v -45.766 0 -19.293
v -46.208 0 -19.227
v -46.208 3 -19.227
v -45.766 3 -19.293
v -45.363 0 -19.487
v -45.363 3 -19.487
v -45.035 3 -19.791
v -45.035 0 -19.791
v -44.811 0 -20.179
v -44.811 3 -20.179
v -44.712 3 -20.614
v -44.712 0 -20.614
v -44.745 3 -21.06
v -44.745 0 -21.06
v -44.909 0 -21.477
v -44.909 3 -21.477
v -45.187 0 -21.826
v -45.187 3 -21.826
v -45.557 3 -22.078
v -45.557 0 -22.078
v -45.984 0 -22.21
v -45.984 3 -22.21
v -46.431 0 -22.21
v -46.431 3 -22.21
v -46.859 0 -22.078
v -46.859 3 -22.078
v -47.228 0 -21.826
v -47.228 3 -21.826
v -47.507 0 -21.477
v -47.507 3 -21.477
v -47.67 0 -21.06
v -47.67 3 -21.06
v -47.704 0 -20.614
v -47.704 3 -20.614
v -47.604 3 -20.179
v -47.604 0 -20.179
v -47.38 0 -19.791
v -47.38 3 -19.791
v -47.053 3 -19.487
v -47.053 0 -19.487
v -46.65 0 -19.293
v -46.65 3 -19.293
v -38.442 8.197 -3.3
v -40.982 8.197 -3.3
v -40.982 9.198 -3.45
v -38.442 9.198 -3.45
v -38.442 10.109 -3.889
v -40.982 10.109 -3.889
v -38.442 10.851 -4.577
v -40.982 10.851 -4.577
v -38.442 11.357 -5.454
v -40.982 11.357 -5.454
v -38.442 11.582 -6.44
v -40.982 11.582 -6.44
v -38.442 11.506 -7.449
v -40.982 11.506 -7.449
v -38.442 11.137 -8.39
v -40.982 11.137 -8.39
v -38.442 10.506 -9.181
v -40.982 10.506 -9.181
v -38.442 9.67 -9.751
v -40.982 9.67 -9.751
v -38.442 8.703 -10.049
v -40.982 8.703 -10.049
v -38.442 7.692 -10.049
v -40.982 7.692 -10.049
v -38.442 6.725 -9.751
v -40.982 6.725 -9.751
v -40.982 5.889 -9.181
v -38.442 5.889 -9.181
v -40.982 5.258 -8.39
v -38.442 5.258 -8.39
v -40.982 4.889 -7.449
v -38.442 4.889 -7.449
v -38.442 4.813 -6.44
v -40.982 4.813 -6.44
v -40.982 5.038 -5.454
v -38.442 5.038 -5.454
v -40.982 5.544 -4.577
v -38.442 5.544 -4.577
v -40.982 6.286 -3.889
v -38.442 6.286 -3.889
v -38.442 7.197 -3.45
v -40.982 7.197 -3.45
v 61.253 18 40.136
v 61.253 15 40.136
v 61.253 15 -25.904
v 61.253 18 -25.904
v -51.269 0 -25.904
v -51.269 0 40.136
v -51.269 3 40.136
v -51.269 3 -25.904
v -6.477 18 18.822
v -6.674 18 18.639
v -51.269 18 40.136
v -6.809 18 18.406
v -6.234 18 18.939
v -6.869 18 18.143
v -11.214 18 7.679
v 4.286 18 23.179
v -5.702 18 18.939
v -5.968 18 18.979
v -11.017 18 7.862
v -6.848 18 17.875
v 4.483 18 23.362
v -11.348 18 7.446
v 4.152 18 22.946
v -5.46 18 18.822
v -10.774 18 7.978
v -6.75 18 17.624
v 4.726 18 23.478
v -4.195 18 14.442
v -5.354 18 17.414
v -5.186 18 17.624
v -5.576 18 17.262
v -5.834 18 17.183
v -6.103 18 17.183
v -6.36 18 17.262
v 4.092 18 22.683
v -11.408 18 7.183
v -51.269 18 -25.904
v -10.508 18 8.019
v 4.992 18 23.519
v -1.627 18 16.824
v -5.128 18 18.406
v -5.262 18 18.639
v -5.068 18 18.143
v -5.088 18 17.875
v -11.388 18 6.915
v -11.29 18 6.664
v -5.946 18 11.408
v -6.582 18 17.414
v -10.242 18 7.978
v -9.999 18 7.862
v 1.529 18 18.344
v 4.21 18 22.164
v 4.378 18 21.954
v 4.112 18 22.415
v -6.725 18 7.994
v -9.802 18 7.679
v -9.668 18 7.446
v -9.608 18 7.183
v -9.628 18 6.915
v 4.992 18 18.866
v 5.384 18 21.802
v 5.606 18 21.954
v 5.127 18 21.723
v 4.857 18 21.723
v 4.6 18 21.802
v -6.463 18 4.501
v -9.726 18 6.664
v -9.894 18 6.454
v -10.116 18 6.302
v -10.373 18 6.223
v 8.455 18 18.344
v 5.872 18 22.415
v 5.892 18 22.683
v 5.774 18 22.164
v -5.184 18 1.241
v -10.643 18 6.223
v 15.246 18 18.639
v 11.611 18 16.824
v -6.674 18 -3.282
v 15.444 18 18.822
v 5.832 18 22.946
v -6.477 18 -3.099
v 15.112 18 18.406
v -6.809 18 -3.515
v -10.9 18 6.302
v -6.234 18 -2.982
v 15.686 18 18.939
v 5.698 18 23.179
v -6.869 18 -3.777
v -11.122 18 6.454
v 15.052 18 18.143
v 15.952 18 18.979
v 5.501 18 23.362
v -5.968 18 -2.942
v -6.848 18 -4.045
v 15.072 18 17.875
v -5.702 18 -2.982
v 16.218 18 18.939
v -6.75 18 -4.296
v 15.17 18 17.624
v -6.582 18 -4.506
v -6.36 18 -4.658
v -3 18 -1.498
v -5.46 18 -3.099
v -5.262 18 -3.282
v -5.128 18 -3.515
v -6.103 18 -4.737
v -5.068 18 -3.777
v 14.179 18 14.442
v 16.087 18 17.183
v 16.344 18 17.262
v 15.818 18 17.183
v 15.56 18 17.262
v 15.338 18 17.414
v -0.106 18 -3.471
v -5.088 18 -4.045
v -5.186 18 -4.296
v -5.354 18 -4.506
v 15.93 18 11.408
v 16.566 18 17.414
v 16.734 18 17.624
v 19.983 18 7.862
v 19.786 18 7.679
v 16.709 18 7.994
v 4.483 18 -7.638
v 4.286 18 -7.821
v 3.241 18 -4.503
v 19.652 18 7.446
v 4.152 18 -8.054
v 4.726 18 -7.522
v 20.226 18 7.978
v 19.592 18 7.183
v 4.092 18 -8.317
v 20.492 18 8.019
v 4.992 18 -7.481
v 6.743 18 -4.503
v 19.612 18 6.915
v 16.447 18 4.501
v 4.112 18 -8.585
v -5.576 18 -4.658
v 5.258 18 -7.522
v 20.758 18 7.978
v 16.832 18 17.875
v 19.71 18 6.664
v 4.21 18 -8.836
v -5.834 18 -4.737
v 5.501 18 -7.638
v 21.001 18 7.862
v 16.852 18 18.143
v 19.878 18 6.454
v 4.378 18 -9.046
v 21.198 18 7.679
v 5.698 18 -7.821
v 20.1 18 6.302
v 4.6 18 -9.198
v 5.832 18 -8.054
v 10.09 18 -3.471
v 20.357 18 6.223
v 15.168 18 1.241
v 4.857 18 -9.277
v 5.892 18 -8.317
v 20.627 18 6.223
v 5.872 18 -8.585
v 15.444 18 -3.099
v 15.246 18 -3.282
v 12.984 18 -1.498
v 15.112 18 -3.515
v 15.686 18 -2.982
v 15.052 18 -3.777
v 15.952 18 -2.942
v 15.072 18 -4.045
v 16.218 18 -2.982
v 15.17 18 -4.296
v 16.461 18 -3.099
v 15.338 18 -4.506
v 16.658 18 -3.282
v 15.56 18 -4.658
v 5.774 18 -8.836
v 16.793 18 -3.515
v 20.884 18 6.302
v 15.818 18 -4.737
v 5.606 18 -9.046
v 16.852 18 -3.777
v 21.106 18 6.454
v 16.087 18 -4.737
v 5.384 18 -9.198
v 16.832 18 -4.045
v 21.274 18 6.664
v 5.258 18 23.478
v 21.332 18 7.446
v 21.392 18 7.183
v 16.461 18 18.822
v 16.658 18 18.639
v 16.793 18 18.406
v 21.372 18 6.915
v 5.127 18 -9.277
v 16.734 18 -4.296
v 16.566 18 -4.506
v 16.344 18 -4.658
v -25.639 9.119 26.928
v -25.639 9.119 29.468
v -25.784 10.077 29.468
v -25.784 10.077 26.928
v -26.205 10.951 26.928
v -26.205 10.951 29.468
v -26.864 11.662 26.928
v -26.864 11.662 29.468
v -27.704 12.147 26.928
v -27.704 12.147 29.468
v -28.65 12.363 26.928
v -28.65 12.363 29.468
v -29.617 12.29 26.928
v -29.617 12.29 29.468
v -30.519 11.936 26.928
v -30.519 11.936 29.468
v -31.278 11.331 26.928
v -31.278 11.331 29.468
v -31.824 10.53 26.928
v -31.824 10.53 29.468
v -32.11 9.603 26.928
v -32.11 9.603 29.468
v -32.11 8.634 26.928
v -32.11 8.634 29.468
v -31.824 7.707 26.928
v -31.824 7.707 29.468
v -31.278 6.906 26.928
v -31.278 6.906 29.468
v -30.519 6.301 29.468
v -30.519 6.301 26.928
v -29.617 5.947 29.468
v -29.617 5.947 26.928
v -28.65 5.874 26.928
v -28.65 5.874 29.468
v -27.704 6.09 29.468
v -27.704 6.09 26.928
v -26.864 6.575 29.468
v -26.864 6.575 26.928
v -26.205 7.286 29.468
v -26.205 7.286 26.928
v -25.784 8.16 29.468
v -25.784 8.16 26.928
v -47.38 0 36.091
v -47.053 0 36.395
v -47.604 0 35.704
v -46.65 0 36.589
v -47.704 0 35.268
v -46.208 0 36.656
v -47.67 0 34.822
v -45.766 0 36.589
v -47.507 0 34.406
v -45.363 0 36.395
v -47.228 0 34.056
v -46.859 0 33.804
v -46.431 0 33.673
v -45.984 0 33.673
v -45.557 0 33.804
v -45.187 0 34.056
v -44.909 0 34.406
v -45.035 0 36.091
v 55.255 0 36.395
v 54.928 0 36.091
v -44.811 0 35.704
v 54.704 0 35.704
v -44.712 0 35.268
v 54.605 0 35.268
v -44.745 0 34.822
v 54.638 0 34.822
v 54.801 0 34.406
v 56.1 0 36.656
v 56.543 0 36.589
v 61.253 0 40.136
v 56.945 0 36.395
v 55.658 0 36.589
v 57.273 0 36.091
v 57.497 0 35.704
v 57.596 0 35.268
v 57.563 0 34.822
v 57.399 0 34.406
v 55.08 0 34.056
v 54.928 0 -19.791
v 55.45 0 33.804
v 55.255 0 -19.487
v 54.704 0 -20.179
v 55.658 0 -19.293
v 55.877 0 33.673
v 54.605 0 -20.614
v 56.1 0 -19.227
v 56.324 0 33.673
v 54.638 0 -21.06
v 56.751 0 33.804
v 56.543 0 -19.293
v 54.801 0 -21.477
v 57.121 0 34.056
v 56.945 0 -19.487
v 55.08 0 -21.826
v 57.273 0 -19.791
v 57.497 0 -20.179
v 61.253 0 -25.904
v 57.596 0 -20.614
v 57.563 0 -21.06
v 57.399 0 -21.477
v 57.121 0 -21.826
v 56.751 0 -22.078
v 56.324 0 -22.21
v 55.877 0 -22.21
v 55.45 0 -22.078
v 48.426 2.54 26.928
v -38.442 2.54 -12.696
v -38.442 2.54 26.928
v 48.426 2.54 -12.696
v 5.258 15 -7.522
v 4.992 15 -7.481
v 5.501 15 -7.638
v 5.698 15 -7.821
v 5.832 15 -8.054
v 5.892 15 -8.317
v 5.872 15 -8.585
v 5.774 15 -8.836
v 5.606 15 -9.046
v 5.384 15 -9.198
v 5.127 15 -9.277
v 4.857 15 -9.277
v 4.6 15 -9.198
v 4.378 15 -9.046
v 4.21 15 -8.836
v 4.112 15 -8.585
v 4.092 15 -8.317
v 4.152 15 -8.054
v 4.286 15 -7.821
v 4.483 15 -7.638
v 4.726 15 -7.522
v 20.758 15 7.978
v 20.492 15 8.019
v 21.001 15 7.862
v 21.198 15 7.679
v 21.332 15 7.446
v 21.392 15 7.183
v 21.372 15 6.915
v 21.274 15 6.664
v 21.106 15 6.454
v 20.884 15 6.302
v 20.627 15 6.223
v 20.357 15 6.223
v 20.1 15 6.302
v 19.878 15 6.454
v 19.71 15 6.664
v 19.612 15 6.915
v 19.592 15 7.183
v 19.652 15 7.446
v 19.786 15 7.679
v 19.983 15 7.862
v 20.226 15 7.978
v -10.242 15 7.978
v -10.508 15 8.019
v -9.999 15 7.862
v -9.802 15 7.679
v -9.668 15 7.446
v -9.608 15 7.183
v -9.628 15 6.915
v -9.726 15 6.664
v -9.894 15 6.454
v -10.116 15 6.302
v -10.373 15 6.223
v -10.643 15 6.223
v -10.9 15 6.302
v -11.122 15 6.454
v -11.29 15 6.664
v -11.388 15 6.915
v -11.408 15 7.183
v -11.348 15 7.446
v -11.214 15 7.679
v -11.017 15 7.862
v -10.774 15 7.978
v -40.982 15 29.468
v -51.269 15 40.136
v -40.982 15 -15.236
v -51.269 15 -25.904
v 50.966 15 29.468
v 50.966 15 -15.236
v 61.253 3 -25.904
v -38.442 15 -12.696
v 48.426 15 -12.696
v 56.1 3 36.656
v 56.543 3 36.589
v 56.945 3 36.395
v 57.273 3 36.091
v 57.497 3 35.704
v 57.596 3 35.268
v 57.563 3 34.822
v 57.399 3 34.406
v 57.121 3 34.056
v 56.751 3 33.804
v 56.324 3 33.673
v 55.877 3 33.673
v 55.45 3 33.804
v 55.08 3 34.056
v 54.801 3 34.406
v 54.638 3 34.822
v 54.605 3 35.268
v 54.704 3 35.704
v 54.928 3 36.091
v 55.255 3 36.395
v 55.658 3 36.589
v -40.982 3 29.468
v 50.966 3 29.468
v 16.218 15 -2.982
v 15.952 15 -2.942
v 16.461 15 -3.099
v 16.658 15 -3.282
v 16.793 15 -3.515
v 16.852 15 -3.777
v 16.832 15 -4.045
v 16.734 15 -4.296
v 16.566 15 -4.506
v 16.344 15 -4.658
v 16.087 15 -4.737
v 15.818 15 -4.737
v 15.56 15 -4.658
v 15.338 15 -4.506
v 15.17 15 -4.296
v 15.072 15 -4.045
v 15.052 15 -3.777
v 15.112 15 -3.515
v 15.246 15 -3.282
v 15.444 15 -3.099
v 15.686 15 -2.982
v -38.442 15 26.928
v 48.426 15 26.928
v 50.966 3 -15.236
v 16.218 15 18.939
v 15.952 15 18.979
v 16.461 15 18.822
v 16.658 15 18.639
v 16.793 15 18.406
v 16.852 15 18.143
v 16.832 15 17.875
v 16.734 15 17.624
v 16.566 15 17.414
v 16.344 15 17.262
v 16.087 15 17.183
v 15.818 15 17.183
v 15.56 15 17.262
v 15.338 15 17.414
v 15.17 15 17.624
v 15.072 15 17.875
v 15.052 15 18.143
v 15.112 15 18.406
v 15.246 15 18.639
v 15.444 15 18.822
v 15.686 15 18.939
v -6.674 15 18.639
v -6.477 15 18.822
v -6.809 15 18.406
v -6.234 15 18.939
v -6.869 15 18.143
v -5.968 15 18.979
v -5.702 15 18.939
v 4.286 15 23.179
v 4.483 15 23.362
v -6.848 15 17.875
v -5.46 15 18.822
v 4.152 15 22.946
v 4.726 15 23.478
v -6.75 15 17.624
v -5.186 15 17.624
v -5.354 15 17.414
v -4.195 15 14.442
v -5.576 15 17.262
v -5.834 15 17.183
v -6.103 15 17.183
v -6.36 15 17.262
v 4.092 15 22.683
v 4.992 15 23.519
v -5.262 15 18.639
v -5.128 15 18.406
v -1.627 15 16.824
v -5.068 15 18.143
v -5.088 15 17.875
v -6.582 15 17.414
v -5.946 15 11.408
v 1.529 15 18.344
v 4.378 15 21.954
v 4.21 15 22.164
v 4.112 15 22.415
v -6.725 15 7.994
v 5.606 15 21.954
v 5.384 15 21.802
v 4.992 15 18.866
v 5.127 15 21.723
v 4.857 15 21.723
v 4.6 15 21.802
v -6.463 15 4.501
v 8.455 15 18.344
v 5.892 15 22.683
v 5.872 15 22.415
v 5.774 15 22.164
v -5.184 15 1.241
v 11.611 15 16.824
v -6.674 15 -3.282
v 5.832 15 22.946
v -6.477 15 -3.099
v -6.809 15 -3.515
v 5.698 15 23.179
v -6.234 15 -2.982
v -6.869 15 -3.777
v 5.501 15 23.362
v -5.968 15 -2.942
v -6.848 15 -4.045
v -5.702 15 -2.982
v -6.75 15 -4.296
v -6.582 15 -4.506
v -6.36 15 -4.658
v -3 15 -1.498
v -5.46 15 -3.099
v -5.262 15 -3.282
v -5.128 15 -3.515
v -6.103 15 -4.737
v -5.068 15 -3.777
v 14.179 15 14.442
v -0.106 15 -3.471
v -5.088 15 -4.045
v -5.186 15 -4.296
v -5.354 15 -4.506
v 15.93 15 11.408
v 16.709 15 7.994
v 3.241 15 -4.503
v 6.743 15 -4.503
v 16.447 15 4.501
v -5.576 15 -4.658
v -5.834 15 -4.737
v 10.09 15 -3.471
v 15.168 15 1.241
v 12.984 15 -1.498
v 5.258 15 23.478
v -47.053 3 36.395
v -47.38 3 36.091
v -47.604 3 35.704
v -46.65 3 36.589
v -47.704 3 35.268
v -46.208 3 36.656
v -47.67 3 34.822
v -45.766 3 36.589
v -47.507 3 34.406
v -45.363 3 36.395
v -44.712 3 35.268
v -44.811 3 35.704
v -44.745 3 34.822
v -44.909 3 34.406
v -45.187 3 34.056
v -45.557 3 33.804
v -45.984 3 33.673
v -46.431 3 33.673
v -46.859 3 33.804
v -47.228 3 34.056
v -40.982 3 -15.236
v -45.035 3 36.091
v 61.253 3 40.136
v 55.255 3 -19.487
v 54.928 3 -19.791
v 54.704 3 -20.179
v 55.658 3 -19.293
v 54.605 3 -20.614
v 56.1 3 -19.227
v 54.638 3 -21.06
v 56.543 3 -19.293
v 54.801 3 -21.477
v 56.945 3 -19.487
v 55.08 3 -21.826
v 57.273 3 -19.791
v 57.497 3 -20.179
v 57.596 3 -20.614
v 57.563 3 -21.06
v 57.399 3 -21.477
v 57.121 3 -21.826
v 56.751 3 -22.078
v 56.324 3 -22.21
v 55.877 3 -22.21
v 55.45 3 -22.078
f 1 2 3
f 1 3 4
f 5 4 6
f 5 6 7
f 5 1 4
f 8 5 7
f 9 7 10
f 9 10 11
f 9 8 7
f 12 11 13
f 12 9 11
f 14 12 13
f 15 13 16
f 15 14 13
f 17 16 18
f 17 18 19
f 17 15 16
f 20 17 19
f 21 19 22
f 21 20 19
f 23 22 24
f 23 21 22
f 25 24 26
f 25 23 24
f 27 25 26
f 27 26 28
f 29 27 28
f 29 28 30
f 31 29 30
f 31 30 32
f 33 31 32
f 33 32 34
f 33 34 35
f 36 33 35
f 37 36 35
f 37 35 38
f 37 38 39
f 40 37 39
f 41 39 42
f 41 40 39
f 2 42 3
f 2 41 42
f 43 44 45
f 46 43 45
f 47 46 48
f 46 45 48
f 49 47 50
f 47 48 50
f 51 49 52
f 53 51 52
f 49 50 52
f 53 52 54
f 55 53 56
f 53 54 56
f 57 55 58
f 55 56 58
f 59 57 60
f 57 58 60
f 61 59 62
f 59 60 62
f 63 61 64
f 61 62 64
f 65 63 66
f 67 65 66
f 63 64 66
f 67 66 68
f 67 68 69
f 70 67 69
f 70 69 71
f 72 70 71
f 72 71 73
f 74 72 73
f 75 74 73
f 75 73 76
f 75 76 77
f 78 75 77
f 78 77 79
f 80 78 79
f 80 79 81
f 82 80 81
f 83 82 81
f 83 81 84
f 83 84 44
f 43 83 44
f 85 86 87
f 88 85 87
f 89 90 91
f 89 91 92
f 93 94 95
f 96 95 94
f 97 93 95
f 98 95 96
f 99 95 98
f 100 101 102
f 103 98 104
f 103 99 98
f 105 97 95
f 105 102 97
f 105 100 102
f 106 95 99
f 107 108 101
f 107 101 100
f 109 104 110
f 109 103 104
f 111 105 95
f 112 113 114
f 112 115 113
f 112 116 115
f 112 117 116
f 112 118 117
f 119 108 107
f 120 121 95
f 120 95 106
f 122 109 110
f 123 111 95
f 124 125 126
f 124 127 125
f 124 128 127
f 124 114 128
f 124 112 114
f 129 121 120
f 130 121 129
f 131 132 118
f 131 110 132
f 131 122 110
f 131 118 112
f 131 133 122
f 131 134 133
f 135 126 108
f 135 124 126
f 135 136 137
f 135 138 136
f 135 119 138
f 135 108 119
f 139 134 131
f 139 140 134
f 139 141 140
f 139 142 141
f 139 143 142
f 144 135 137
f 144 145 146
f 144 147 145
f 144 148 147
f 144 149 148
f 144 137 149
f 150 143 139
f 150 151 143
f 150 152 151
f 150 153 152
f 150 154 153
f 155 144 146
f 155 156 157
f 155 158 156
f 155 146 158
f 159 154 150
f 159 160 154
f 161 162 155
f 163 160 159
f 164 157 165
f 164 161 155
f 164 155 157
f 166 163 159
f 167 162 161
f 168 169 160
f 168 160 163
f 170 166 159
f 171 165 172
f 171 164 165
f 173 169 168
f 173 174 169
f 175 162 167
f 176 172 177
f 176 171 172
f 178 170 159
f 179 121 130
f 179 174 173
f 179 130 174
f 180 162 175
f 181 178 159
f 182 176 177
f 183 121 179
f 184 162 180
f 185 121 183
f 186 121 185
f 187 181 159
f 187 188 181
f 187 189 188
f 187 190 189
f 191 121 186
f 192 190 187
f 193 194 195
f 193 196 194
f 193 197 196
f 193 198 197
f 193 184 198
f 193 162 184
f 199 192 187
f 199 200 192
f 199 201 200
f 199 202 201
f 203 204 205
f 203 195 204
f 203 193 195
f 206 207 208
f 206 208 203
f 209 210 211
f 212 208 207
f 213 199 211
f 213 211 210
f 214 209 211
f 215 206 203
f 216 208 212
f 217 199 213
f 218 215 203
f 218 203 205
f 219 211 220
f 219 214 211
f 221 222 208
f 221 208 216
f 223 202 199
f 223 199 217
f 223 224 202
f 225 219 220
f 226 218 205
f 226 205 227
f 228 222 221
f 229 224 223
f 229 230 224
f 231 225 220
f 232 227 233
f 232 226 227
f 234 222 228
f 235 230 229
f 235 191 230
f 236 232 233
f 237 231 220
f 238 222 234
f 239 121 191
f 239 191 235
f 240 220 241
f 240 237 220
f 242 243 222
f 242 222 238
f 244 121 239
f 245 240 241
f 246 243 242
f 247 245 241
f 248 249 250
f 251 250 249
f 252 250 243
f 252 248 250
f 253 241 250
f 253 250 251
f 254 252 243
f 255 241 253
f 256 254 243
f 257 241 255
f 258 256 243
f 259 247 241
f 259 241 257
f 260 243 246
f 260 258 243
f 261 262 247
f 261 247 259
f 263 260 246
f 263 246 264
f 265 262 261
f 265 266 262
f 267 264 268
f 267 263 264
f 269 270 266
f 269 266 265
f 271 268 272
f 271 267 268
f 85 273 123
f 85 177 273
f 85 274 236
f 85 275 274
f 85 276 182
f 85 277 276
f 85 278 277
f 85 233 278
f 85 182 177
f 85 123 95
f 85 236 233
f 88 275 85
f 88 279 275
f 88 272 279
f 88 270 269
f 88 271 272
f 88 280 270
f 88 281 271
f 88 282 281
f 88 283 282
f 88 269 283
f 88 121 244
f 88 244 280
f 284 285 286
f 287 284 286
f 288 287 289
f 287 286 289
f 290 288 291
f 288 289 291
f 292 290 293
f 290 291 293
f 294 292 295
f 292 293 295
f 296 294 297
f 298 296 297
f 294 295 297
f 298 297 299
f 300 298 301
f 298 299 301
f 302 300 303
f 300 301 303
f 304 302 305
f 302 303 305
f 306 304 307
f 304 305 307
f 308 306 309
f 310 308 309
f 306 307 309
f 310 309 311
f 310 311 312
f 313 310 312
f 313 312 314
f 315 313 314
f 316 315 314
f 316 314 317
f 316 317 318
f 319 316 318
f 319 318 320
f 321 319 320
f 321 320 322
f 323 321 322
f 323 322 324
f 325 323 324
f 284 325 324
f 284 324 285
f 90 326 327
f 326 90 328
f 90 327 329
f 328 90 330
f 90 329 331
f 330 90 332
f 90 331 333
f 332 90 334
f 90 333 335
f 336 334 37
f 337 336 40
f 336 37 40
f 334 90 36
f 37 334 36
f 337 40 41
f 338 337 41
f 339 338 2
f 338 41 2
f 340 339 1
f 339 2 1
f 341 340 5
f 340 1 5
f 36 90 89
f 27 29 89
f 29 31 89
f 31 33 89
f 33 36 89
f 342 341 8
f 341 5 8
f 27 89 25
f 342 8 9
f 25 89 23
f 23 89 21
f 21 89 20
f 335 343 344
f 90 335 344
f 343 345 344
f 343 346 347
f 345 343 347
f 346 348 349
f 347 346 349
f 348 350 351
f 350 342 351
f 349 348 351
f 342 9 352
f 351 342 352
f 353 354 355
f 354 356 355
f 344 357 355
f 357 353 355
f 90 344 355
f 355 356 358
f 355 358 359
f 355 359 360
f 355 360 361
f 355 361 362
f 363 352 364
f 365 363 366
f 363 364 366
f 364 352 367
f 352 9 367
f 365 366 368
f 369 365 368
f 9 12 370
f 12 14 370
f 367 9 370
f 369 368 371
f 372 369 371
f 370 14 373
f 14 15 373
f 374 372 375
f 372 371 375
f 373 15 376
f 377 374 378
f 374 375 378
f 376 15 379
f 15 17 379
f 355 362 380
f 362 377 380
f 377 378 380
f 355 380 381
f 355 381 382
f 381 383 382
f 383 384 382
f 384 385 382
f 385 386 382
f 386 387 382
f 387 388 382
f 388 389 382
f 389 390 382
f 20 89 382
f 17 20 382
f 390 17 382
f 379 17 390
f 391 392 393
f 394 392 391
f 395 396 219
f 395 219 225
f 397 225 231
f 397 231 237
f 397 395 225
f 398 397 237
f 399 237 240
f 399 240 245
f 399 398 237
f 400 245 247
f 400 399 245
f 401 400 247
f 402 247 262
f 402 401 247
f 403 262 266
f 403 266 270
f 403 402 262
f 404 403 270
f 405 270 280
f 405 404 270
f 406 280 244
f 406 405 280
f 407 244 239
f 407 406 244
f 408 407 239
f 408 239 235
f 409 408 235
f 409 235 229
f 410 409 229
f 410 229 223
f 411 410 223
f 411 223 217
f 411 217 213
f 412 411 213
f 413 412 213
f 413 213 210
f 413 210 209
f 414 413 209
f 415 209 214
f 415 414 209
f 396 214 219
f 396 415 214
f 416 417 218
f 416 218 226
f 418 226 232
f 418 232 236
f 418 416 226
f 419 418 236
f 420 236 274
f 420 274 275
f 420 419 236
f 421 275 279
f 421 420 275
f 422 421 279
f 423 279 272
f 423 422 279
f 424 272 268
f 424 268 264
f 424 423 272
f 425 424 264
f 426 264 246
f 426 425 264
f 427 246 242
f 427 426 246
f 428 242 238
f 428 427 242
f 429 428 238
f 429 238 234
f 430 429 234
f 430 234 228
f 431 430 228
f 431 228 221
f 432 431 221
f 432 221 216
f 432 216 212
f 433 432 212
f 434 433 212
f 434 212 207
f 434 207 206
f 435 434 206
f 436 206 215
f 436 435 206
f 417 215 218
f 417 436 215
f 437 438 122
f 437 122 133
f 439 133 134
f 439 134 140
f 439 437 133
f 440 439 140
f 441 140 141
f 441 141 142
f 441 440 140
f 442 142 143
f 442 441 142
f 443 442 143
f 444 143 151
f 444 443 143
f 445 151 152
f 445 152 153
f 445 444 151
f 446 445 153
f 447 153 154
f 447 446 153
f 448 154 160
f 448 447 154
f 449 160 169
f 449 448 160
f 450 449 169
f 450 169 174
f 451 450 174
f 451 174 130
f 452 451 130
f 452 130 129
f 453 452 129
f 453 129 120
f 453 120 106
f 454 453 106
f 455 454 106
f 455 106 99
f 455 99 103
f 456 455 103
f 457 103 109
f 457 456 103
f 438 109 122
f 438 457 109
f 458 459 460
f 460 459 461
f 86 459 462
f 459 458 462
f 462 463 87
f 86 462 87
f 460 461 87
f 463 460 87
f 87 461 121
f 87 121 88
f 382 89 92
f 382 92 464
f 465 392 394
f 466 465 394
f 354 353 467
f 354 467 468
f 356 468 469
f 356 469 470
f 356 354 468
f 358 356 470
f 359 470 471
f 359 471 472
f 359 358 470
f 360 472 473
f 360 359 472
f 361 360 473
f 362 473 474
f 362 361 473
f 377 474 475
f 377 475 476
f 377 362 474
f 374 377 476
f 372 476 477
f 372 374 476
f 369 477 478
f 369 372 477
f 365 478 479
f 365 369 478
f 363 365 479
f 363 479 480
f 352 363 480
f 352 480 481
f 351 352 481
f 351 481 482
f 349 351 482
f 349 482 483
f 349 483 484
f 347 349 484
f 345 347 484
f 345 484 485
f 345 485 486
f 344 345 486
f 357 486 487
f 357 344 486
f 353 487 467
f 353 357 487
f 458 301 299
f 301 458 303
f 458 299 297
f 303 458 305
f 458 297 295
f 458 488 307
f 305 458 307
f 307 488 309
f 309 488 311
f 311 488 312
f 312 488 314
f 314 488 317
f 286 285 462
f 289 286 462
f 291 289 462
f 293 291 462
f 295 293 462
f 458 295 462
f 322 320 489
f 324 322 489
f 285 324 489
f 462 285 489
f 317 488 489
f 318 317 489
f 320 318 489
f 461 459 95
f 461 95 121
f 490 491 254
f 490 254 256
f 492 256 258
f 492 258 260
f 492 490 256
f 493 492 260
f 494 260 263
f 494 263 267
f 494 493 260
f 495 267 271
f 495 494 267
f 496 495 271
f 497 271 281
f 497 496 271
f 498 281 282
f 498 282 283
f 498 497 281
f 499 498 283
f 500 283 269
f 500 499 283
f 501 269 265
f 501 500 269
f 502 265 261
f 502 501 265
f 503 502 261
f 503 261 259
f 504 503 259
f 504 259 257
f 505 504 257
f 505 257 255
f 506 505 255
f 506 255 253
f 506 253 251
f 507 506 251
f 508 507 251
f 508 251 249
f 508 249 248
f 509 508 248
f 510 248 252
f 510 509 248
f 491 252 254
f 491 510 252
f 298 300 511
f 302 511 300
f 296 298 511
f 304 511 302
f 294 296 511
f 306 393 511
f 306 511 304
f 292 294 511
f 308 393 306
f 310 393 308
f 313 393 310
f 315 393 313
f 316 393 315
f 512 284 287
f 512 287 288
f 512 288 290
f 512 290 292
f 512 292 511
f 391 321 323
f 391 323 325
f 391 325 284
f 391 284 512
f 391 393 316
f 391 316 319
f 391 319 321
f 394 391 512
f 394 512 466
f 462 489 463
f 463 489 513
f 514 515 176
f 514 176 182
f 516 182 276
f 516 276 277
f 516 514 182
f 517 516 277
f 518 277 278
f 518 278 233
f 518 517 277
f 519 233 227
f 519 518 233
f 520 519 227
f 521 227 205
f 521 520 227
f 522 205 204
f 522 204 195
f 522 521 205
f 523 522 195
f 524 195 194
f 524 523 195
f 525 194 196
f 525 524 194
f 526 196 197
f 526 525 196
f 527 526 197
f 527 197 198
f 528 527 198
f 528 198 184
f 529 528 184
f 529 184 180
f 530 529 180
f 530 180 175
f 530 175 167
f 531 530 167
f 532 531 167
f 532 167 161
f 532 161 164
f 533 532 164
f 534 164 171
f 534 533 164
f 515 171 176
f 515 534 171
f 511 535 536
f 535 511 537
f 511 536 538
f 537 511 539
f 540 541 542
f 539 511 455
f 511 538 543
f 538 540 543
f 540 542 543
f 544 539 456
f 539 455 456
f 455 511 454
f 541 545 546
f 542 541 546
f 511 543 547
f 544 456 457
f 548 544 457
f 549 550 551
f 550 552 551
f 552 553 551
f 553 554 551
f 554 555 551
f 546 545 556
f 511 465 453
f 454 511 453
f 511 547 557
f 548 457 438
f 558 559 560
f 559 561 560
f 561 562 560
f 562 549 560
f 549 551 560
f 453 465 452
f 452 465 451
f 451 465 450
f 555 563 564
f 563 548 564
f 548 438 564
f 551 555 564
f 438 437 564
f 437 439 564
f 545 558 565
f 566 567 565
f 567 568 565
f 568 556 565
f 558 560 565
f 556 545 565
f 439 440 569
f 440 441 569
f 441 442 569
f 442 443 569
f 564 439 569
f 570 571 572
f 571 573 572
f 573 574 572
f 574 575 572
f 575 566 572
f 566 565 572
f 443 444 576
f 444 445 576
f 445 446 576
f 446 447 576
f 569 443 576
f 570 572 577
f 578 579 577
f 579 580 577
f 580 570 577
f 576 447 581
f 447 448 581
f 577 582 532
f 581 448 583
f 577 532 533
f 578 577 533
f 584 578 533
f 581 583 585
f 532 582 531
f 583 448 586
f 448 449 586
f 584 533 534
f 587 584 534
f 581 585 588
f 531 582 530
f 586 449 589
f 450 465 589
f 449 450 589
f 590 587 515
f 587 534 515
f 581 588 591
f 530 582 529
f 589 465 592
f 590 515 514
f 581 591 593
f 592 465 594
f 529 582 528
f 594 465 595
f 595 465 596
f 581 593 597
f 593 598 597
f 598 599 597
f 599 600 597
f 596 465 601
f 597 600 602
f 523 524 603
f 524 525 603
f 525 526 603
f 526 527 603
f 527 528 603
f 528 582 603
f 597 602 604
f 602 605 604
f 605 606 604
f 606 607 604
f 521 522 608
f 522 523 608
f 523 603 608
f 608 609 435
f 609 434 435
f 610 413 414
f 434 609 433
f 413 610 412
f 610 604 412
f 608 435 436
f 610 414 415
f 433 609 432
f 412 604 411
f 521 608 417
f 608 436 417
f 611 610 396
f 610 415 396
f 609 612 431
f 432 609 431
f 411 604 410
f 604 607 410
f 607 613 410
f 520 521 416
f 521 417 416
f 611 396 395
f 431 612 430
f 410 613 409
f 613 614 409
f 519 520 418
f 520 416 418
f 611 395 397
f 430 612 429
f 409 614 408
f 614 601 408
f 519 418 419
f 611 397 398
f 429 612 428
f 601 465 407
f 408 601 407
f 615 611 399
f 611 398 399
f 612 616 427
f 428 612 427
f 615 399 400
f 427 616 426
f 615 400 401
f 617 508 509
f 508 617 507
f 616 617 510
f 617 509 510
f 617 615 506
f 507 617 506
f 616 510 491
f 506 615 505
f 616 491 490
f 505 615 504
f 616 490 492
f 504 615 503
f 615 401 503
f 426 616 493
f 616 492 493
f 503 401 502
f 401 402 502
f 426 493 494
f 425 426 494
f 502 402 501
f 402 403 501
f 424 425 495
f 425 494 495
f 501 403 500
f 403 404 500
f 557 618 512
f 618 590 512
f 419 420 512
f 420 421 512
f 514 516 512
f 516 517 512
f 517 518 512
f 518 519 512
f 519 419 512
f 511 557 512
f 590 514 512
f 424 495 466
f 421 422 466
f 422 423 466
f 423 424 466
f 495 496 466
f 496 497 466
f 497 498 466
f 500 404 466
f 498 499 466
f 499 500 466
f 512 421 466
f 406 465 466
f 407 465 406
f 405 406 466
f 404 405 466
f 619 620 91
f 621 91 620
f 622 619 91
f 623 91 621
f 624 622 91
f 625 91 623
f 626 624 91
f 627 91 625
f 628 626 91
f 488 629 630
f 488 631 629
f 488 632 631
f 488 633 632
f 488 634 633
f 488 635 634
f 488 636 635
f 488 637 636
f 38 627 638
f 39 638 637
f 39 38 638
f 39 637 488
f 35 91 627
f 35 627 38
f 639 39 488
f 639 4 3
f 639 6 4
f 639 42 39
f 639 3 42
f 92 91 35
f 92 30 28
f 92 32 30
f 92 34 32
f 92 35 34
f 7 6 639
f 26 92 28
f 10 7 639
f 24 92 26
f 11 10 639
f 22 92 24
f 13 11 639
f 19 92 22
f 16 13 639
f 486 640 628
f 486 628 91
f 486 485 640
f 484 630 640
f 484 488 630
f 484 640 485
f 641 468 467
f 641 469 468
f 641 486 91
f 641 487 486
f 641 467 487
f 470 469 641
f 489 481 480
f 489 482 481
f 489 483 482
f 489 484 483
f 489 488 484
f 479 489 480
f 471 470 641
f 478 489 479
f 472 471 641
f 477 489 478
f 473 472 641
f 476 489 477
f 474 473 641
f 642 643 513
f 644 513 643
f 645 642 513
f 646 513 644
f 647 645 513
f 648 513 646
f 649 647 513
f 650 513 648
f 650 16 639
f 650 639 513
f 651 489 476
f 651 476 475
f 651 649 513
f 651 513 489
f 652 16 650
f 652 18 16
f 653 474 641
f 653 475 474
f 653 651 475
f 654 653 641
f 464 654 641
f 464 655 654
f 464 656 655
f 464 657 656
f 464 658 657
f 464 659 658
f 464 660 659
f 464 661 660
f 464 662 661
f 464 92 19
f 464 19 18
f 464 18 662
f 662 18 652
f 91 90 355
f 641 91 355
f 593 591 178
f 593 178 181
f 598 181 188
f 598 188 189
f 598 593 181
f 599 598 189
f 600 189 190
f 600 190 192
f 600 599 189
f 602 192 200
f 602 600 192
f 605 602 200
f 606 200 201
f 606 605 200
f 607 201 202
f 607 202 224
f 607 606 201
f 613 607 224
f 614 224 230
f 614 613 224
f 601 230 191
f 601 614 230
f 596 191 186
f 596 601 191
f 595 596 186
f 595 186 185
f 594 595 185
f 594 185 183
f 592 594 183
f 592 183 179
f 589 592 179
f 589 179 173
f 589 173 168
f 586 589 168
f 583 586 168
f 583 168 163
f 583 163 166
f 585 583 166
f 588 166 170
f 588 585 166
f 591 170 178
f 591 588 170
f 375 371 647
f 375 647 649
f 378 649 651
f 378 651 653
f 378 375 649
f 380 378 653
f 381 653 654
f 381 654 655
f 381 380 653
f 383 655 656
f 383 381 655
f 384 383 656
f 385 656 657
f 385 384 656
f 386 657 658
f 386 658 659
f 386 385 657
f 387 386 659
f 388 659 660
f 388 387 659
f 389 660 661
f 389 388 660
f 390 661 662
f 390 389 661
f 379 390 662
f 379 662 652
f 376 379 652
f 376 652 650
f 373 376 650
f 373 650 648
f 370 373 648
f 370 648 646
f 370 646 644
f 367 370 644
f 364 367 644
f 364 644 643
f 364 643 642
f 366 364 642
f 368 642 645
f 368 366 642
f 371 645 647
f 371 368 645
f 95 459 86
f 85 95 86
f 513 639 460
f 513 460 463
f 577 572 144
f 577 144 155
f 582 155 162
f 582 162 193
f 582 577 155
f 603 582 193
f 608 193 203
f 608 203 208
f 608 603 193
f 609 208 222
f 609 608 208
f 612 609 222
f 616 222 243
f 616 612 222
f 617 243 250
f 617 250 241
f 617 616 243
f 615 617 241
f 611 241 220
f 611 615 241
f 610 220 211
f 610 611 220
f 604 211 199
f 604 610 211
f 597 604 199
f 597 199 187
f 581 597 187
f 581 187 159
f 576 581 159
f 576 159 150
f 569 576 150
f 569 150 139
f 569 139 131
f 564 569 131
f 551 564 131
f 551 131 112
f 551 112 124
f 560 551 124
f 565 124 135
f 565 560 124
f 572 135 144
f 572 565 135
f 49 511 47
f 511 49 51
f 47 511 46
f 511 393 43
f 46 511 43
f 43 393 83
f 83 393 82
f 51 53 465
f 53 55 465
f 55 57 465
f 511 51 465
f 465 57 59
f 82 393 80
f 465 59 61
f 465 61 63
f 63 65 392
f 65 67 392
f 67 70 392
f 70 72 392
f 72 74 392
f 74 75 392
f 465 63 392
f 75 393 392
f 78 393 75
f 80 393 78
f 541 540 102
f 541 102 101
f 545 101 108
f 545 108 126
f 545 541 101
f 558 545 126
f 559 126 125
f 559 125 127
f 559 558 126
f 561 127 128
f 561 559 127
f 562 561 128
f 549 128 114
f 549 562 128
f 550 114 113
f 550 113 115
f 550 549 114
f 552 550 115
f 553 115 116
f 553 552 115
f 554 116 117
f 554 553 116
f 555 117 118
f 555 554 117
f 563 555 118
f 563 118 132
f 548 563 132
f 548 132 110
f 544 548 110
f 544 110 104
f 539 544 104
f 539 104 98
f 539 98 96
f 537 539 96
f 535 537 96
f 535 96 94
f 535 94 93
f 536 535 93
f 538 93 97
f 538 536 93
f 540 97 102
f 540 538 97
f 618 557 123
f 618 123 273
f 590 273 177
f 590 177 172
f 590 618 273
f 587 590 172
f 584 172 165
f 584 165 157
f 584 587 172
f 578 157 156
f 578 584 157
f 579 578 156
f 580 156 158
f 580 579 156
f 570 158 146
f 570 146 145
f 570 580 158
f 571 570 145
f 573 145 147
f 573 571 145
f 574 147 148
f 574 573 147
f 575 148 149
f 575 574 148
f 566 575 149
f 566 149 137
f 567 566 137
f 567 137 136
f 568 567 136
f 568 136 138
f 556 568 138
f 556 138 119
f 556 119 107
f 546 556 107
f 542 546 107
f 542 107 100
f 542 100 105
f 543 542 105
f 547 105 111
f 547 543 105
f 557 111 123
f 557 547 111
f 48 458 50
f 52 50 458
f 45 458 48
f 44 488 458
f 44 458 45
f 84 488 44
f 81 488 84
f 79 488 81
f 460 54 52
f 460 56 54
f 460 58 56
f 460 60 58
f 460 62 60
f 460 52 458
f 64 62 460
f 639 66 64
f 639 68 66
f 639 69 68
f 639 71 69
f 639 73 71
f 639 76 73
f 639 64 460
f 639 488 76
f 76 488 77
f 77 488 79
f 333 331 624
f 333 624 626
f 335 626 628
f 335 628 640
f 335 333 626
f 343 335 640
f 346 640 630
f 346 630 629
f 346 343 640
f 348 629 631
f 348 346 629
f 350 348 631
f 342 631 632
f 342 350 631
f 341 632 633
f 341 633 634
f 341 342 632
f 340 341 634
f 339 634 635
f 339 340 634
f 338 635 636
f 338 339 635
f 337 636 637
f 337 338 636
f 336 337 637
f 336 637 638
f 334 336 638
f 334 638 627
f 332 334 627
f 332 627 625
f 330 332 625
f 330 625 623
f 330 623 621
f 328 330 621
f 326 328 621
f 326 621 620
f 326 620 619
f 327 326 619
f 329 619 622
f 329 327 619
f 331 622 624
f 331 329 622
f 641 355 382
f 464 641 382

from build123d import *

# Parameters (mm, degrees)
SKETCH1_W           = 112.522
SKETCH1_H           = 66.04
SKETCH1_R           = 1.5
BOSS_EXTRUDE1_DEPTH = 3
SKETCH4_W           = 91.948
SKETCH4_H           = 44.704
BOSS_EXTRUDE2_DEPTH = 12
SHELL1_T            = -2.54
SKETCH13_R          = 3.253406585
CUT_EXTRUDE1_DEPTH  = 8.19
SKETCH15_R          = 3.393829234
CUT_EXTRUDE2_DEPTH  = 8.19
SKETCH16_W          = 112.522
SKETCH16_H          = 66.04
SKETCH16_R          = 11.75
SKETCH16_R_2        = 0.902882747
BOSS_EXTRUDE4_DEPTH = 3


with BuildPart() as part:
    # Sketch1 → Boss-Extrude1 (new body)
    with BuildSketch(Plane(origin=(0, 0, 0), x_dir=(1, 0, 0), z_dir=(0, 1, 0))):
        with Locations((4.991983213, -7.115654676)):
            Rectangle(SKETCH1_W, SKETCH1_H)
        with Locations(Location((-46.207741765, 20.726518927, 0), (0, 0, 270))):
            Circle(SKETCH1_R, mode=Mode.SUBTRACT)
        with Locations(Location((56.100367261, 20.726518927, 0), (0, 0, 270))):
            Circle(SKETCH1_R, mode=Mode.SUBTRACT)
        with Locations(Location((56.100367261, -35.155923699, 0), (0, 0, 270))):
            Circle(SKETCH1_R, mode=Mode.SUBTRACT)
        with Locations(Location((-46.207741765, -35.155923699, 0), (0, 0, 270))):
            Circle(SKETCH1_R, mode=Mode.SUBTRACT)
    extrude(amount=BOSS_EXTRUDE1_DEPTH)

    # Sketch4 → Boss-Extrude2 (add)
    with BuildSketch(Plane(origin=(0, 3, 0), x_dir=(1, 0, 0), z_dir=(0, 1, 0))):
        with Locations((4.991983213, -7.115654676)):
            Rectangle(SKETCH4_W, SKETCH4_H)
    extrude(amount=BOSS_EXTRUDE2_DEPTH)

    # Shell1
    shell1_openings = [part.faces().sort_by_distance(p)[0] for p in [
        (4.991983213, 15, 7.115654676),
    ]]
    offset(amount=SHELL1_T, openings=shell1_openings, kind=Kind.INTERSECTION)

    # Sketch13 → Cut-Extrude1 (cut)
    with BuildSketch(Plane.XY.offset(29.467654676)):
        with Locations((-28.892784248, 9.118527178)):
            Circle(SKETCH13_R)
    extrude(amount=-CUT_EXTRUDE1_DEPTH, mode=Mode.SUBTRACT)

    # Sketch15 → Cut-Extrude2 (cut)
    with BuildSketch(Plane.ZY.offset(40.982016787)):
        with Locations((-6.693412029, 8.197427611)):
            Circle(SKETCH15_R)
    extrude(amount=-CUT_EXTRUDE2_DEPTH, mode=Mode.SUBTRACT)

    # Sketch16 → Boss-Extrude4 (add)
    with BuildSketch(Plane(origin=(0, 15, 0), x_dir=(1, 0, 0), z_dir=(0, 1, 0))):
        with Locations((4.991983213, -7.115654676)):
            Rectangle(SKETCH16_W, SKETCH16_H)
        with Locations(Location((4.991983213, -7.115654676, 0), (0, 0, 270))):
            Circle(SKETCH16_R, mode=Mode.SUBTRACT)
        with Locations(Location((4.991983213, 8.384345324, 0), (0, 0, 270))):
            Circle(SKETCH16_R_2, mode=Mode.SUBTRACT)
        with Locations(Location((-5.968171895, 3.844500432, 0), (0, 0, 270))):
            Circle(SKETCH16_R_2, mode=Mode.SUBTRACT)
        with Locations(Location((-10.508016787, -7.115654676, 0), (0, 0, 270))):
            Circle(SKETCH16_R_2, mode=Mode.SUBTRACT)
        with Locations(Location((-5.968171895, -18.075809785, 0), (0, 0, 270))):
            Circle(SKETCH16_R_2, mode=Mode.SUBTRACT)
        with Locations(Location((4.991983213, -22.615654676, 0), (0, 0, 270))):
            Circle(SKETCH16_R_2, mode=Mode.SUBTRACT)
        with Locations(Location((15.952138322, -18.075809785, 0), (0, 0, 270))):
            Circle(SKETCH16_R_2, mode=Mode.SUBTRACT)
        with Locations(Location((20.491983213, -7.115654676, 0), (0, 0, 270))):
            Circle(SKETCH16_R_2, mode=Mode.SUBTRACT)
        with Locations(Location((15.952138322, 3.844500432, 0), (0, 0, 270))):
            Circle(SKETCH16_R_2, mode=Mode.SUBTRACT)
    extrude(amount=BOSS_EXTRUDE4_DEPTH)


solid = part.part
